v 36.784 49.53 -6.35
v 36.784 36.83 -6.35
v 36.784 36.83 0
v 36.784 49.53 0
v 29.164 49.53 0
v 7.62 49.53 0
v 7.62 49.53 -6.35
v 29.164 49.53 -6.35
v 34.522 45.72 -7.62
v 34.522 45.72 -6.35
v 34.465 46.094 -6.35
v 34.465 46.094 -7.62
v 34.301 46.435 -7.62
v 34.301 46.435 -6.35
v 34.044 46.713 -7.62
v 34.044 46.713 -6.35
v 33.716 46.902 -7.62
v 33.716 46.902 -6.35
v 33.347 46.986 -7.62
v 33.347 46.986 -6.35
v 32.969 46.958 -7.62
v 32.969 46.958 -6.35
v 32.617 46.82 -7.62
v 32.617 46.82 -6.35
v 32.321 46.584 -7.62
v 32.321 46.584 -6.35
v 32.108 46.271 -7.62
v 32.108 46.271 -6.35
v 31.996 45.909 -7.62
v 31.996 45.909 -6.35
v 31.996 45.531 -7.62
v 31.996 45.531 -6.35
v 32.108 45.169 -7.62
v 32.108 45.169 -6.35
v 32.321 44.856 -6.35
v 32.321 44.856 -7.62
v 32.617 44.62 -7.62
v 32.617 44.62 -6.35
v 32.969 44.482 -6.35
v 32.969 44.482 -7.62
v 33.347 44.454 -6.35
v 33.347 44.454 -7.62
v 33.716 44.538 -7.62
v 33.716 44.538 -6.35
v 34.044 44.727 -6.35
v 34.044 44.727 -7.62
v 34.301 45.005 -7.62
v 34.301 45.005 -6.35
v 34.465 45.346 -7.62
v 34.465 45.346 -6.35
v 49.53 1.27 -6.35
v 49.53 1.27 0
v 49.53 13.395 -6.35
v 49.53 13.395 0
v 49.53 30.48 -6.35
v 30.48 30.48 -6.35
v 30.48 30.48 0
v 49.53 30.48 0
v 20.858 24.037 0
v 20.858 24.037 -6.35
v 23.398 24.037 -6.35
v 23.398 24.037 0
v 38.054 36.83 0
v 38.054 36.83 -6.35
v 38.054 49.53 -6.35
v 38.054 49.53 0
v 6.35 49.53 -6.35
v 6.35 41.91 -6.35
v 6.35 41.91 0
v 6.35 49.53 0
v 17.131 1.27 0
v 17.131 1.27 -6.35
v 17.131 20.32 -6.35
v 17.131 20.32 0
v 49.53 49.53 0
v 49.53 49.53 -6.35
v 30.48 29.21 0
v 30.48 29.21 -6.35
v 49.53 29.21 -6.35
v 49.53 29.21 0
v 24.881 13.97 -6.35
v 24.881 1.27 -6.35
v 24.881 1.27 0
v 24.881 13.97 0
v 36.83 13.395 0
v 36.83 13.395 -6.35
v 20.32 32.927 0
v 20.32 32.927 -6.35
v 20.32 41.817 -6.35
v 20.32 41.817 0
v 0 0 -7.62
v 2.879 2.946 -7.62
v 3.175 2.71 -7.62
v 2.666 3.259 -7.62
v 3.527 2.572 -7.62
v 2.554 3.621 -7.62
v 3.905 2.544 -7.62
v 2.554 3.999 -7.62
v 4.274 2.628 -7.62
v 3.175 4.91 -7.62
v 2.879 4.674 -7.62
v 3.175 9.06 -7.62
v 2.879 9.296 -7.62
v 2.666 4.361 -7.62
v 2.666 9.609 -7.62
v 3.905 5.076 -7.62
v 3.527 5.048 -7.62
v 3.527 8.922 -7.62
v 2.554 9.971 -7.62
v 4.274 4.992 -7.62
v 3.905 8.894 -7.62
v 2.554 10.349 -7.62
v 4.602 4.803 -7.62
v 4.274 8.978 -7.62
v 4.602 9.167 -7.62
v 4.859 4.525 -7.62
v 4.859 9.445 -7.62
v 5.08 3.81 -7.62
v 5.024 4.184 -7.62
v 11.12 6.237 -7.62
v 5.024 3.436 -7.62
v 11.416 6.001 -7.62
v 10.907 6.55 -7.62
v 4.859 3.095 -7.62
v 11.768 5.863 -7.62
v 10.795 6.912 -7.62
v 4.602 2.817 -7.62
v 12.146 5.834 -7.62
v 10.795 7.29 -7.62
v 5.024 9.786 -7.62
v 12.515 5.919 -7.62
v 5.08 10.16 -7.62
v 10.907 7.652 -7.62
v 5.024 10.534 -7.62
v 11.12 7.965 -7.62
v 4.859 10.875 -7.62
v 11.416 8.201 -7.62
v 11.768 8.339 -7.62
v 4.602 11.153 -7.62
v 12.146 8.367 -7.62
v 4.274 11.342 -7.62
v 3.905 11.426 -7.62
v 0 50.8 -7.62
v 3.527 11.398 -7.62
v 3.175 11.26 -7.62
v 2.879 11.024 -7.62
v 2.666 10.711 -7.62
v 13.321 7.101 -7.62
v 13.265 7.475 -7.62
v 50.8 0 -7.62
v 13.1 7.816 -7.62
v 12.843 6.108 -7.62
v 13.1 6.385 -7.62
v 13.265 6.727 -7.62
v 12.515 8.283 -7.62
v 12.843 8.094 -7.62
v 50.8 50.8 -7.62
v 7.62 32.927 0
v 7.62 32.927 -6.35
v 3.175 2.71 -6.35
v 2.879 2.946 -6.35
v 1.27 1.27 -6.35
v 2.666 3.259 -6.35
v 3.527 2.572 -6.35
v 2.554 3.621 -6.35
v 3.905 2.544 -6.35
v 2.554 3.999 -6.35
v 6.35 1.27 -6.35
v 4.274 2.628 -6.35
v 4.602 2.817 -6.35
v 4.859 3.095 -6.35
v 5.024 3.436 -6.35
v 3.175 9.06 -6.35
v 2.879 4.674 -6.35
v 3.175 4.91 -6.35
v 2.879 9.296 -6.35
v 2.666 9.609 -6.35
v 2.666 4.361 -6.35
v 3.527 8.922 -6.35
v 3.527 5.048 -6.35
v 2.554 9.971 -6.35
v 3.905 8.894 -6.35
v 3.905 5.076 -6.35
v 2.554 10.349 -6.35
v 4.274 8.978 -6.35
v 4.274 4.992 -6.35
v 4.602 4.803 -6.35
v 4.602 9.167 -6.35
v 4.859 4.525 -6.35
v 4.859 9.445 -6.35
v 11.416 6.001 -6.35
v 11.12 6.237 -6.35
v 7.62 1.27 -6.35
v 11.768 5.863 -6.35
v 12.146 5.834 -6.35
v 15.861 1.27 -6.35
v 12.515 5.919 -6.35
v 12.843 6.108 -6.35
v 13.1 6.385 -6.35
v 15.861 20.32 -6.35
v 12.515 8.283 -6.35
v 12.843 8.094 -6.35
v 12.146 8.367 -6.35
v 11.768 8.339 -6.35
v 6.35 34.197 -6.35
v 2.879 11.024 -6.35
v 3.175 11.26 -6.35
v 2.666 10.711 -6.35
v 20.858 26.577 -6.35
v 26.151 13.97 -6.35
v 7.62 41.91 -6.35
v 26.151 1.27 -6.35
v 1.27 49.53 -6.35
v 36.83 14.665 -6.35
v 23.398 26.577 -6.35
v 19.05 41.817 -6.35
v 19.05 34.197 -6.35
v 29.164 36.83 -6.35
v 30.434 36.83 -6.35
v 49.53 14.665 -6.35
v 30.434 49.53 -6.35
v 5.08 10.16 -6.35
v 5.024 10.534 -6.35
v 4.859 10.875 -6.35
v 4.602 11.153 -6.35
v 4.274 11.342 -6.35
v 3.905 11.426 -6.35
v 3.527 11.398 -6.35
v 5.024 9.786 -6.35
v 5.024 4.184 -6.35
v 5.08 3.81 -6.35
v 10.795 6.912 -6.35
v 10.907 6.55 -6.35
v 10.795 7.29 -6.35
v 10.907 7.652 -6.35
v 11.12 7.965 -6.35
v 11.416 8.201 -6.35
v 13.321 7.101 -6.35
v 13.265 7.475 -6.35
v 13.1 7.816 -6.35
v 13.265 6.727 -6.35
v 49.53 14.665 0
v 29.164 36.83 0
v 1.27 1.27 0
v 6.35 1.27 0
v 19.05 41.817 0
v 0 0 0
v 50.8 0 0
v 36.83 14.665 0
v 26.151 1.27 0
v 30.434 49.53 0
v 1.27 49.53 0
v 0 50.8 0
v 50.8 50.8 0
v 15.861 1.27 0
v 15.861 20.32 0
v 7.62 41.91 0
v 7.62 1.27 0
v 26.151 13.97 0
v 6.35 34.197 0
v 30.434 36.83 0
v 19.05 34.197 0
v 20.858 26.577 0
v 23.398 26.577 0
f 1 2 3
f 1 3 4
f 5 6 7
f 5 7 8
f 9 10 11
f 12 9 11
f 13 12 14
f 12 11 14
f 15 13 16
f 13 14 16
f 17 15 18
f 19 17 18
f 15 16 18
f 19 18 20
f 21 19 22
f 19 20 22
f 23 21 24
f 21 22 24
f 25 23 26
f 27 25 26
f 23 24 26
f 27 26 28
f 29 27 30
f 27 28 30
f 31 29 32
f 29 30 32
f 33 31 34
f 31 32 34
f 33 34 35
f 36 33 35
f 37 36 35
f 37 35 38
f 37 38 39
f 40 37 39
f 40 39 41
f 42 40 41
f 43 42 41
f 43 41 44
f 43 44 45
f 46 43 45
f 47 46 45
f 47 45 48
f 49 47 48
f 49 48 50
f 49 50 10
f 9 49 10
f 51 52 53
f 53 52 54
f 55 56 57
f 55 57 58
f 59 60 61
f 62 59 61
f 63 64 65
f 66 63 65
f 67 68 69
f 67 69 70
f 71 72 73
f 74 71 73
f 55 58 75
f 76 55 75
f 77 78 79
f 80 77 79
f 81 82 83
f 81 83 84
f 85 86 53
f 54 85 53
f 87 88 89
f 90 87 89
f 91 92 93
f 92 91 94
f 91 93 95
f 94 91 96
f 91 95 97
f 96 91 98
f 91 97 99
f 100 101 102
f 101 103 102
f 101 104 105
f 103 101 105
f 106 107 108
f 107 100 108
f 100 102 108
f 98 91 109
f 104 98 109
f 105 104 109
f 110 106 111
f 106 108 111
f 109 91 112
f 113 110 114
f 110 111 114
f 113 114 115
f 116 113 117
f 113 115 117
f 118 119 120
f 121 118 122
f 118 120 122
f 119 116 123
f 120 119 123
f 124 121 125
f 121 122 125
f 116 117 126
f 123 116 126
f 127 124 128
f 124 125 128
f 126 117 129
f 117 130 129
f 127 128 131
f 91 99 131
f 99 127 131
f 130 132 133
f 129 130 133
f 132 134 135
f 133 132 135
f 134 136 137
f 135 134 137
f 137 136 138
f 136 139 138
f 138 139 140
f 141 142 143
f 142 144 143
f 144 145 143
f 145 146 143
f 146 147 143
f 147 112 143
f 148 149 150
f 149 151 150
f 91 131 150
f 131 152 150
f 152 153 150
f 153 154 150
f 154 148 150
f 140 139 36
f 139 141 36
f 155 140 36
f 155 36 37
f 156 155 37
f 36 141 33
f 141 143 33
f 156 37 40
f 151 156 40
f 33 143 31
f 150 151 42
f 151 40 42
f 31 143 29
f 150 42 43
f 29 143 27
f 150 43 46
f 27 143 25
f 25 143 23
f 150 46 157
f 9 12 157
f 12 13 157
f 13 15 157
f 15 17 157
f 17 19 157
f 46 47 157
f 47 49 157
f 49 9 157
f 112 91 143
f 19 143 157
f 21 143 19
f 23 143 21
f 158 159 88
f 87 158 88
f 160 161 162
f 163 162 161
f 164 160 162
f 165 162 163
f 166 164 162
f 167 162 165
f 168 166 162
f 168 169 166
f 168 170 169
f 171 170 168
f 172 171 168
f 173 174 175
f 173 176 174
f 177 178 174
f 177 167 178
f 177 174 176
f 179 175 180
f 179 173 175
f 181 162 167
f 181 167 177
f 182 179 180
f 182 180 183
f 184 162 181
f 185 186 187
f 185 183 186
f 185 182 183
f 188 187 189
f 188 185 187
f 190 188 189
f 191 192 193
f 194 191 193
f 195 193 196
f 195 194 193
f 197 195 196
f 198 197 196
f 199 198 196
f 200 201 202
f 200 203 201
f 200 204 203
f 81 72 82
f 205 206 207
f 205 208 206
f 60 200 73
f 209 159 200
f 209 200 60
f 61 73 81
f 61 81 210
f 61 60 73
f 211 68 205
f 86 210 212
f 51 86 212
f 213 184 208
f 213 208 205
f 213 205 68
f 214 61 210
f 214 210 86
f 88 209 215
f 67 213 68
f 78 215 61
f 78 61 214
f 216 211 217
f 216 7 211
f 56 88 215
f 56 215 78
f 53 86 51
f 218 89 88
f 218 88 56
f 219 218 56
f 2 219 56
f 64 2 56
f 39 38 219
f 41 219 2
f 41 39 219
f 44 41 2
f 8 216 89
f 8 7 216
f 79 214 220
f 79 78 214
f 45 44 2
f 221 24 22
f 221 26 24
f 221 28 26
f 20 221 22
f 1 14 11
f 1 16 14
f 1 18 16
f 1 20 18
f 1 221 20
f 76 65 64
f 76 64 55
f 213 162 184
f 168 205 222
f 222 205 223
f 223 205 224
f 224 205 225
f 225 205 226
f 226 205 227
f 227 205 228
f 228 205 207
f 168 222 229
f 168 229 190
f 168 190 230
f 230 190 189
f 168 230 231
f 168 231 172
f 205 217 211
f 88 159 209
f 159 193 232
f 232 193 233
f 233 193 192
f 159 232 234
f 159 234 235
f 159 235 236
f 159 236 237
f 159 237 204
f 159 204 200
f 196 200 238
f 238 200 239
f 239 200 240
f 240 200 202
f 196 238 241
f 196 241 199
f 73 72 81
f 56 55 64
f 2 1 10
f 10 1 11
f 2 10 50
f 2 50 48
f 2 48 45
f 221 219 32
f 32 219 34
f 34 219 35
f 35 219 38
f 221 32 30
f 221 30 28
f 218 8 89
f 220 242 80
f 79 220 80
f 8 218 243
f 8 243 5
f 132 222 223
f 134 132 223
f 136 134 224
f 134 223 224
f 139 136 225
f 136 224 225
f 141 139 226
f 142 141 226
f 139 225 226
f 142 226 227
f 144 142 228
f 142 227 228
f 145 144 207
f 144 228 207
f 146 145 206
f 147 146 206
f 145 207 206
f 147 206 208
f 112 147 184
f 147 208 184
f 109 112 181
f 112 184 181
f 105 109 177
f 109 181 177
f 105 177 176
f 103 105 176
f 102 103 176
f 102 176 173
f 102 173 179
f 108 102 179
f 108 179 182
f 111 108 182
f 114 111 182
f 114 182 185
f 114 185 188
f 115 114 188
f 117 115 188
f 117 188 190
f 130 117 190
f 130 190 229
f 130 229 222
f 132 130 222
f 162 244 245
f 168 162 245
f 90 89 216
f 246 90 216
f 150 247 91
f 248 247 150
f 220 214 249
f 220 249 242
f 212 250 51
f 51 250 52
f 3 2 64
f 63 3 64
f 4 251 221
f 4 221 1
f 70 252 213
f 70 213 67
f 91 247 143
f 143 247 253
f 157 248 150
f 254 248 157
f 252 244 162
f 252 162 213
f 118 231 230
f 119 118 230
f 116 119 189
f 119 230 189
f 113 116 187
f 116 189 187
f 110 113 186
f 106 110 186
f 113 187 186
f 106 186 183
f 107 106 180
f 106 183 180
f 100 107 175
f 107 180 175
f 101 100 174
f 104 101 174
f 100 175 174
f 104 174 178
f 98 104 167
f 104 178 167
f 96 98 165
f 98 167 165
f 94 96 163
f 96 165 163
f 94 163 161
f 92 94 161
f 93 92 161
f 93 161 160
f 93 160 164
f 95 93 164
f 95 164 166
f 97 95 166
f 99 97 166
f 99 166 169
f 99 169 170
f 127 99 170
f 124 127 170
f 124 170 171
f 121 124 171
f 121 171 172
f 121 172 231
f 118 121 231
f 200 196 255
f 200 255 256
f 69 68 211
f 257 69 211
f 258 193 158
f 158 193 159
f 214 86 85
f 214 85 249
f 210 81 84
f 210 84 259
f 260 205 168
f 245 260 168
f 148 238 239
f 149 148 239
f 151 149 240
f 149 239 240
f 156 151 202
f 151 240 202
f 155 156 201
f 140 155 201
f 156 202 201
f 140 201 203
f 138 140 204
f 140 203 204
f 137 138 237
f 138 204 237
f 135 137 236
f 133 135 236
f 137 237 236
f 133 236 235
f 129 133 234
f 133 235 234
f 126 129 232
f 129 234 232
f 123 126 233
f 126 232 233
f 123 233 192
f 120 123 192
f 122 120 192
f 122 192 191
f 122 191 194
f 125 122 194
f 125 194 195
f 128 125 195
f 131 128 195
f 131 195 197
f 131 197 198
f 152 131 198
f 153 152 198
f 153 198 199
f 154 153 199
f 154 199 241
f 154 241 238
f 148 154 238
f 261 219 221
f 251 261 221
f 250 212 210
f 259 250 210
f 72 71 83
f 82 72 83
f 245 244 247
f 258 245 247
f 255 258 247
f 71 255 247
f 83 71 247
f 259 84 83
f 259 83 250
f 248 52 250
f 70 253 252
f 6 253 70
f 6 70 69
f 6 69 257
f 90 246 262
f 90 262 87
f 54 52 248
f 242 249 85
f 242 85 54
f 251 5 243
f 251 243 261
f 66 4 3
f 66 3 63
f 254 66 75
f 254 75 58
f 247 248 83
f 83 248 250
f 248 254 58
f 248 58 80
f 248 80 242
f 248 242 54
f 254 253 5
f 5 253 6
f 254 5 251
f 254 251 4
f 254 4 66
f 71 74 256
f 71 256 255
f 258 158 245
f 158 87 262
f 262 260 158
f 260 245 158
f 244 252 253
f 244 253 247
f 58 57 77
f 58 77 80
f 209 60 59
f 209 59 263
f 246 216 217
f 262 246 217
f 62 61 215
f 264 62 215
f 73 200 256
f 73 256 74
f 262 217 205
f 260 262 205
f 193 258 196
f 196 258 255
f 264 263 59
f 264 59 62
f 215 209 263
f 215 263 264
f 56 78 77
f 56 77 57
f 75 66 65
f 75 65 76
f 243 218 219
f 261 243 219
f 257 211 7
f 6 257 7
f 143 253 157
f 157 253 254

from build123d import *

# Parameters (mm, degrees)
F0_W      = 50.8
F0_H      = 50.8
F1_DEPTH  = 7.62
F2_T      = -1.27
F3_W      = 1.27
F3_H      = 31.657300781
F3_H_2    = 7.62
F3_H_3    = 12.7
F3_W_2    = 19.05
F3_H_4    = 1.27
F3_H_5    = 19.05
F3_W_3    = 12.7
F3_W_4    = 2.54
F3_H_6    = 2.54
F4_DEPTH  = 6.35
F5_R      = 1.27
F6_DEPTH  = 25.4
F7_R      = 1.27
F8_DEPTH  = 25.4
F9_R      = 1.27
F10_DEPTH = 25.4
F11_R     = 1.27
F12_DEPTH = 25.4


with BuildPart() as f1:
    # F0 (on Top) → F1 (new body)
    with BuildSketch(Plane.XY):
        with Locations((25.4, 25.4)):
            Rectangle(F0_W, F0_H)
    extrude(amount=-F1_DEPTH)

    # F2
    f2_openings = [f1.faces().sort_by_distance(p)[0] for p in [
        (25.4, 25.4, 0),
    ]]
    offset(amount=F2_T, openings=f2_openings)

    # F3 (on face) → F4 (join)
    with BuildSketch(Plane.XY.offset(-6.35)):
        with Locations((6.985, 17.0986503905)):
            Rectangle(F3_W, F3_H)
        Polygon((6.35, 34.197300781), (6.35, 32.927300781), (7.62, 32.927300781), (20.32, 32.927300781), (20.32, 41.817300781), (19.05, 41.817300781), (19.05, 34.197300781), align=None)
        with Locations((6.985, 45.72)):
            Rectangle(F3_W, F3_H_2)
        with Locations((29.7986493057, 43.18)):
            Rectangle(F3_W, F3_H_3)
        with Locations((40.005, 29.8451691666)):
            Rectangle(F3_W_2, F3_H_4)
        with Locations((37.4186493057, 43.18)):
            Rectangle(F3_W, F3_H_3)
        with Locations((16.496093998, 10.795)):
            Rectangle(F3_W, F3_H_5)
        with Locations((43.18, 14.0302554315)):
            Rectangle(F3_W_3, F3_H_4)
        with Locations((25.515874902, 7.62)):
            Rectangle(F3_W, F3_H_3)
        with Locations((22.1276638252, 25.3072996777)):
            Rectangle(F3_W_4, F3_H_6)
    extrude(amount=F4_DEPTH)

    # F5 (on face) → F6 (cut)
    with BuildSketch(Plane.XY.offset(-6.35)):
        with Locations((33.2517512143, 45.72)):
            Circle(F5_R)
    extrude(amount=-F6_DEPTH, mode=Mode.SUBTRACT)

    # F7 (on face) → F8 (cut)
    with BuildSketch(Plane.XY.offset(-6.35)):
        with Locations((12.051093998, 7.1008764207)):
            Circle(F7_R)
    extrude(amount=-F8_DEPTH, mode=Mode.SUBTRACT)

    # F9 (on face) → F10 (cut)
    with BuildSketch(Plane.XY.offset(-6.35)):
        with Locations((3.81, 3.81)):
            Circle(F9_R)
    extrude(amount=-F10_DEPTH, mode=Mode.SUBTRACT)

    # F11 (on face) → F12 (cut)
    with BuildSketch(Plane.XY.offset(-6.35)):
        with Locations((3.81, 10.16)):
            Circle(F11_R)
    extrude(amount=-F12_DEPTH, mode=Mode.SUBTRACT)


solid = f1.part
